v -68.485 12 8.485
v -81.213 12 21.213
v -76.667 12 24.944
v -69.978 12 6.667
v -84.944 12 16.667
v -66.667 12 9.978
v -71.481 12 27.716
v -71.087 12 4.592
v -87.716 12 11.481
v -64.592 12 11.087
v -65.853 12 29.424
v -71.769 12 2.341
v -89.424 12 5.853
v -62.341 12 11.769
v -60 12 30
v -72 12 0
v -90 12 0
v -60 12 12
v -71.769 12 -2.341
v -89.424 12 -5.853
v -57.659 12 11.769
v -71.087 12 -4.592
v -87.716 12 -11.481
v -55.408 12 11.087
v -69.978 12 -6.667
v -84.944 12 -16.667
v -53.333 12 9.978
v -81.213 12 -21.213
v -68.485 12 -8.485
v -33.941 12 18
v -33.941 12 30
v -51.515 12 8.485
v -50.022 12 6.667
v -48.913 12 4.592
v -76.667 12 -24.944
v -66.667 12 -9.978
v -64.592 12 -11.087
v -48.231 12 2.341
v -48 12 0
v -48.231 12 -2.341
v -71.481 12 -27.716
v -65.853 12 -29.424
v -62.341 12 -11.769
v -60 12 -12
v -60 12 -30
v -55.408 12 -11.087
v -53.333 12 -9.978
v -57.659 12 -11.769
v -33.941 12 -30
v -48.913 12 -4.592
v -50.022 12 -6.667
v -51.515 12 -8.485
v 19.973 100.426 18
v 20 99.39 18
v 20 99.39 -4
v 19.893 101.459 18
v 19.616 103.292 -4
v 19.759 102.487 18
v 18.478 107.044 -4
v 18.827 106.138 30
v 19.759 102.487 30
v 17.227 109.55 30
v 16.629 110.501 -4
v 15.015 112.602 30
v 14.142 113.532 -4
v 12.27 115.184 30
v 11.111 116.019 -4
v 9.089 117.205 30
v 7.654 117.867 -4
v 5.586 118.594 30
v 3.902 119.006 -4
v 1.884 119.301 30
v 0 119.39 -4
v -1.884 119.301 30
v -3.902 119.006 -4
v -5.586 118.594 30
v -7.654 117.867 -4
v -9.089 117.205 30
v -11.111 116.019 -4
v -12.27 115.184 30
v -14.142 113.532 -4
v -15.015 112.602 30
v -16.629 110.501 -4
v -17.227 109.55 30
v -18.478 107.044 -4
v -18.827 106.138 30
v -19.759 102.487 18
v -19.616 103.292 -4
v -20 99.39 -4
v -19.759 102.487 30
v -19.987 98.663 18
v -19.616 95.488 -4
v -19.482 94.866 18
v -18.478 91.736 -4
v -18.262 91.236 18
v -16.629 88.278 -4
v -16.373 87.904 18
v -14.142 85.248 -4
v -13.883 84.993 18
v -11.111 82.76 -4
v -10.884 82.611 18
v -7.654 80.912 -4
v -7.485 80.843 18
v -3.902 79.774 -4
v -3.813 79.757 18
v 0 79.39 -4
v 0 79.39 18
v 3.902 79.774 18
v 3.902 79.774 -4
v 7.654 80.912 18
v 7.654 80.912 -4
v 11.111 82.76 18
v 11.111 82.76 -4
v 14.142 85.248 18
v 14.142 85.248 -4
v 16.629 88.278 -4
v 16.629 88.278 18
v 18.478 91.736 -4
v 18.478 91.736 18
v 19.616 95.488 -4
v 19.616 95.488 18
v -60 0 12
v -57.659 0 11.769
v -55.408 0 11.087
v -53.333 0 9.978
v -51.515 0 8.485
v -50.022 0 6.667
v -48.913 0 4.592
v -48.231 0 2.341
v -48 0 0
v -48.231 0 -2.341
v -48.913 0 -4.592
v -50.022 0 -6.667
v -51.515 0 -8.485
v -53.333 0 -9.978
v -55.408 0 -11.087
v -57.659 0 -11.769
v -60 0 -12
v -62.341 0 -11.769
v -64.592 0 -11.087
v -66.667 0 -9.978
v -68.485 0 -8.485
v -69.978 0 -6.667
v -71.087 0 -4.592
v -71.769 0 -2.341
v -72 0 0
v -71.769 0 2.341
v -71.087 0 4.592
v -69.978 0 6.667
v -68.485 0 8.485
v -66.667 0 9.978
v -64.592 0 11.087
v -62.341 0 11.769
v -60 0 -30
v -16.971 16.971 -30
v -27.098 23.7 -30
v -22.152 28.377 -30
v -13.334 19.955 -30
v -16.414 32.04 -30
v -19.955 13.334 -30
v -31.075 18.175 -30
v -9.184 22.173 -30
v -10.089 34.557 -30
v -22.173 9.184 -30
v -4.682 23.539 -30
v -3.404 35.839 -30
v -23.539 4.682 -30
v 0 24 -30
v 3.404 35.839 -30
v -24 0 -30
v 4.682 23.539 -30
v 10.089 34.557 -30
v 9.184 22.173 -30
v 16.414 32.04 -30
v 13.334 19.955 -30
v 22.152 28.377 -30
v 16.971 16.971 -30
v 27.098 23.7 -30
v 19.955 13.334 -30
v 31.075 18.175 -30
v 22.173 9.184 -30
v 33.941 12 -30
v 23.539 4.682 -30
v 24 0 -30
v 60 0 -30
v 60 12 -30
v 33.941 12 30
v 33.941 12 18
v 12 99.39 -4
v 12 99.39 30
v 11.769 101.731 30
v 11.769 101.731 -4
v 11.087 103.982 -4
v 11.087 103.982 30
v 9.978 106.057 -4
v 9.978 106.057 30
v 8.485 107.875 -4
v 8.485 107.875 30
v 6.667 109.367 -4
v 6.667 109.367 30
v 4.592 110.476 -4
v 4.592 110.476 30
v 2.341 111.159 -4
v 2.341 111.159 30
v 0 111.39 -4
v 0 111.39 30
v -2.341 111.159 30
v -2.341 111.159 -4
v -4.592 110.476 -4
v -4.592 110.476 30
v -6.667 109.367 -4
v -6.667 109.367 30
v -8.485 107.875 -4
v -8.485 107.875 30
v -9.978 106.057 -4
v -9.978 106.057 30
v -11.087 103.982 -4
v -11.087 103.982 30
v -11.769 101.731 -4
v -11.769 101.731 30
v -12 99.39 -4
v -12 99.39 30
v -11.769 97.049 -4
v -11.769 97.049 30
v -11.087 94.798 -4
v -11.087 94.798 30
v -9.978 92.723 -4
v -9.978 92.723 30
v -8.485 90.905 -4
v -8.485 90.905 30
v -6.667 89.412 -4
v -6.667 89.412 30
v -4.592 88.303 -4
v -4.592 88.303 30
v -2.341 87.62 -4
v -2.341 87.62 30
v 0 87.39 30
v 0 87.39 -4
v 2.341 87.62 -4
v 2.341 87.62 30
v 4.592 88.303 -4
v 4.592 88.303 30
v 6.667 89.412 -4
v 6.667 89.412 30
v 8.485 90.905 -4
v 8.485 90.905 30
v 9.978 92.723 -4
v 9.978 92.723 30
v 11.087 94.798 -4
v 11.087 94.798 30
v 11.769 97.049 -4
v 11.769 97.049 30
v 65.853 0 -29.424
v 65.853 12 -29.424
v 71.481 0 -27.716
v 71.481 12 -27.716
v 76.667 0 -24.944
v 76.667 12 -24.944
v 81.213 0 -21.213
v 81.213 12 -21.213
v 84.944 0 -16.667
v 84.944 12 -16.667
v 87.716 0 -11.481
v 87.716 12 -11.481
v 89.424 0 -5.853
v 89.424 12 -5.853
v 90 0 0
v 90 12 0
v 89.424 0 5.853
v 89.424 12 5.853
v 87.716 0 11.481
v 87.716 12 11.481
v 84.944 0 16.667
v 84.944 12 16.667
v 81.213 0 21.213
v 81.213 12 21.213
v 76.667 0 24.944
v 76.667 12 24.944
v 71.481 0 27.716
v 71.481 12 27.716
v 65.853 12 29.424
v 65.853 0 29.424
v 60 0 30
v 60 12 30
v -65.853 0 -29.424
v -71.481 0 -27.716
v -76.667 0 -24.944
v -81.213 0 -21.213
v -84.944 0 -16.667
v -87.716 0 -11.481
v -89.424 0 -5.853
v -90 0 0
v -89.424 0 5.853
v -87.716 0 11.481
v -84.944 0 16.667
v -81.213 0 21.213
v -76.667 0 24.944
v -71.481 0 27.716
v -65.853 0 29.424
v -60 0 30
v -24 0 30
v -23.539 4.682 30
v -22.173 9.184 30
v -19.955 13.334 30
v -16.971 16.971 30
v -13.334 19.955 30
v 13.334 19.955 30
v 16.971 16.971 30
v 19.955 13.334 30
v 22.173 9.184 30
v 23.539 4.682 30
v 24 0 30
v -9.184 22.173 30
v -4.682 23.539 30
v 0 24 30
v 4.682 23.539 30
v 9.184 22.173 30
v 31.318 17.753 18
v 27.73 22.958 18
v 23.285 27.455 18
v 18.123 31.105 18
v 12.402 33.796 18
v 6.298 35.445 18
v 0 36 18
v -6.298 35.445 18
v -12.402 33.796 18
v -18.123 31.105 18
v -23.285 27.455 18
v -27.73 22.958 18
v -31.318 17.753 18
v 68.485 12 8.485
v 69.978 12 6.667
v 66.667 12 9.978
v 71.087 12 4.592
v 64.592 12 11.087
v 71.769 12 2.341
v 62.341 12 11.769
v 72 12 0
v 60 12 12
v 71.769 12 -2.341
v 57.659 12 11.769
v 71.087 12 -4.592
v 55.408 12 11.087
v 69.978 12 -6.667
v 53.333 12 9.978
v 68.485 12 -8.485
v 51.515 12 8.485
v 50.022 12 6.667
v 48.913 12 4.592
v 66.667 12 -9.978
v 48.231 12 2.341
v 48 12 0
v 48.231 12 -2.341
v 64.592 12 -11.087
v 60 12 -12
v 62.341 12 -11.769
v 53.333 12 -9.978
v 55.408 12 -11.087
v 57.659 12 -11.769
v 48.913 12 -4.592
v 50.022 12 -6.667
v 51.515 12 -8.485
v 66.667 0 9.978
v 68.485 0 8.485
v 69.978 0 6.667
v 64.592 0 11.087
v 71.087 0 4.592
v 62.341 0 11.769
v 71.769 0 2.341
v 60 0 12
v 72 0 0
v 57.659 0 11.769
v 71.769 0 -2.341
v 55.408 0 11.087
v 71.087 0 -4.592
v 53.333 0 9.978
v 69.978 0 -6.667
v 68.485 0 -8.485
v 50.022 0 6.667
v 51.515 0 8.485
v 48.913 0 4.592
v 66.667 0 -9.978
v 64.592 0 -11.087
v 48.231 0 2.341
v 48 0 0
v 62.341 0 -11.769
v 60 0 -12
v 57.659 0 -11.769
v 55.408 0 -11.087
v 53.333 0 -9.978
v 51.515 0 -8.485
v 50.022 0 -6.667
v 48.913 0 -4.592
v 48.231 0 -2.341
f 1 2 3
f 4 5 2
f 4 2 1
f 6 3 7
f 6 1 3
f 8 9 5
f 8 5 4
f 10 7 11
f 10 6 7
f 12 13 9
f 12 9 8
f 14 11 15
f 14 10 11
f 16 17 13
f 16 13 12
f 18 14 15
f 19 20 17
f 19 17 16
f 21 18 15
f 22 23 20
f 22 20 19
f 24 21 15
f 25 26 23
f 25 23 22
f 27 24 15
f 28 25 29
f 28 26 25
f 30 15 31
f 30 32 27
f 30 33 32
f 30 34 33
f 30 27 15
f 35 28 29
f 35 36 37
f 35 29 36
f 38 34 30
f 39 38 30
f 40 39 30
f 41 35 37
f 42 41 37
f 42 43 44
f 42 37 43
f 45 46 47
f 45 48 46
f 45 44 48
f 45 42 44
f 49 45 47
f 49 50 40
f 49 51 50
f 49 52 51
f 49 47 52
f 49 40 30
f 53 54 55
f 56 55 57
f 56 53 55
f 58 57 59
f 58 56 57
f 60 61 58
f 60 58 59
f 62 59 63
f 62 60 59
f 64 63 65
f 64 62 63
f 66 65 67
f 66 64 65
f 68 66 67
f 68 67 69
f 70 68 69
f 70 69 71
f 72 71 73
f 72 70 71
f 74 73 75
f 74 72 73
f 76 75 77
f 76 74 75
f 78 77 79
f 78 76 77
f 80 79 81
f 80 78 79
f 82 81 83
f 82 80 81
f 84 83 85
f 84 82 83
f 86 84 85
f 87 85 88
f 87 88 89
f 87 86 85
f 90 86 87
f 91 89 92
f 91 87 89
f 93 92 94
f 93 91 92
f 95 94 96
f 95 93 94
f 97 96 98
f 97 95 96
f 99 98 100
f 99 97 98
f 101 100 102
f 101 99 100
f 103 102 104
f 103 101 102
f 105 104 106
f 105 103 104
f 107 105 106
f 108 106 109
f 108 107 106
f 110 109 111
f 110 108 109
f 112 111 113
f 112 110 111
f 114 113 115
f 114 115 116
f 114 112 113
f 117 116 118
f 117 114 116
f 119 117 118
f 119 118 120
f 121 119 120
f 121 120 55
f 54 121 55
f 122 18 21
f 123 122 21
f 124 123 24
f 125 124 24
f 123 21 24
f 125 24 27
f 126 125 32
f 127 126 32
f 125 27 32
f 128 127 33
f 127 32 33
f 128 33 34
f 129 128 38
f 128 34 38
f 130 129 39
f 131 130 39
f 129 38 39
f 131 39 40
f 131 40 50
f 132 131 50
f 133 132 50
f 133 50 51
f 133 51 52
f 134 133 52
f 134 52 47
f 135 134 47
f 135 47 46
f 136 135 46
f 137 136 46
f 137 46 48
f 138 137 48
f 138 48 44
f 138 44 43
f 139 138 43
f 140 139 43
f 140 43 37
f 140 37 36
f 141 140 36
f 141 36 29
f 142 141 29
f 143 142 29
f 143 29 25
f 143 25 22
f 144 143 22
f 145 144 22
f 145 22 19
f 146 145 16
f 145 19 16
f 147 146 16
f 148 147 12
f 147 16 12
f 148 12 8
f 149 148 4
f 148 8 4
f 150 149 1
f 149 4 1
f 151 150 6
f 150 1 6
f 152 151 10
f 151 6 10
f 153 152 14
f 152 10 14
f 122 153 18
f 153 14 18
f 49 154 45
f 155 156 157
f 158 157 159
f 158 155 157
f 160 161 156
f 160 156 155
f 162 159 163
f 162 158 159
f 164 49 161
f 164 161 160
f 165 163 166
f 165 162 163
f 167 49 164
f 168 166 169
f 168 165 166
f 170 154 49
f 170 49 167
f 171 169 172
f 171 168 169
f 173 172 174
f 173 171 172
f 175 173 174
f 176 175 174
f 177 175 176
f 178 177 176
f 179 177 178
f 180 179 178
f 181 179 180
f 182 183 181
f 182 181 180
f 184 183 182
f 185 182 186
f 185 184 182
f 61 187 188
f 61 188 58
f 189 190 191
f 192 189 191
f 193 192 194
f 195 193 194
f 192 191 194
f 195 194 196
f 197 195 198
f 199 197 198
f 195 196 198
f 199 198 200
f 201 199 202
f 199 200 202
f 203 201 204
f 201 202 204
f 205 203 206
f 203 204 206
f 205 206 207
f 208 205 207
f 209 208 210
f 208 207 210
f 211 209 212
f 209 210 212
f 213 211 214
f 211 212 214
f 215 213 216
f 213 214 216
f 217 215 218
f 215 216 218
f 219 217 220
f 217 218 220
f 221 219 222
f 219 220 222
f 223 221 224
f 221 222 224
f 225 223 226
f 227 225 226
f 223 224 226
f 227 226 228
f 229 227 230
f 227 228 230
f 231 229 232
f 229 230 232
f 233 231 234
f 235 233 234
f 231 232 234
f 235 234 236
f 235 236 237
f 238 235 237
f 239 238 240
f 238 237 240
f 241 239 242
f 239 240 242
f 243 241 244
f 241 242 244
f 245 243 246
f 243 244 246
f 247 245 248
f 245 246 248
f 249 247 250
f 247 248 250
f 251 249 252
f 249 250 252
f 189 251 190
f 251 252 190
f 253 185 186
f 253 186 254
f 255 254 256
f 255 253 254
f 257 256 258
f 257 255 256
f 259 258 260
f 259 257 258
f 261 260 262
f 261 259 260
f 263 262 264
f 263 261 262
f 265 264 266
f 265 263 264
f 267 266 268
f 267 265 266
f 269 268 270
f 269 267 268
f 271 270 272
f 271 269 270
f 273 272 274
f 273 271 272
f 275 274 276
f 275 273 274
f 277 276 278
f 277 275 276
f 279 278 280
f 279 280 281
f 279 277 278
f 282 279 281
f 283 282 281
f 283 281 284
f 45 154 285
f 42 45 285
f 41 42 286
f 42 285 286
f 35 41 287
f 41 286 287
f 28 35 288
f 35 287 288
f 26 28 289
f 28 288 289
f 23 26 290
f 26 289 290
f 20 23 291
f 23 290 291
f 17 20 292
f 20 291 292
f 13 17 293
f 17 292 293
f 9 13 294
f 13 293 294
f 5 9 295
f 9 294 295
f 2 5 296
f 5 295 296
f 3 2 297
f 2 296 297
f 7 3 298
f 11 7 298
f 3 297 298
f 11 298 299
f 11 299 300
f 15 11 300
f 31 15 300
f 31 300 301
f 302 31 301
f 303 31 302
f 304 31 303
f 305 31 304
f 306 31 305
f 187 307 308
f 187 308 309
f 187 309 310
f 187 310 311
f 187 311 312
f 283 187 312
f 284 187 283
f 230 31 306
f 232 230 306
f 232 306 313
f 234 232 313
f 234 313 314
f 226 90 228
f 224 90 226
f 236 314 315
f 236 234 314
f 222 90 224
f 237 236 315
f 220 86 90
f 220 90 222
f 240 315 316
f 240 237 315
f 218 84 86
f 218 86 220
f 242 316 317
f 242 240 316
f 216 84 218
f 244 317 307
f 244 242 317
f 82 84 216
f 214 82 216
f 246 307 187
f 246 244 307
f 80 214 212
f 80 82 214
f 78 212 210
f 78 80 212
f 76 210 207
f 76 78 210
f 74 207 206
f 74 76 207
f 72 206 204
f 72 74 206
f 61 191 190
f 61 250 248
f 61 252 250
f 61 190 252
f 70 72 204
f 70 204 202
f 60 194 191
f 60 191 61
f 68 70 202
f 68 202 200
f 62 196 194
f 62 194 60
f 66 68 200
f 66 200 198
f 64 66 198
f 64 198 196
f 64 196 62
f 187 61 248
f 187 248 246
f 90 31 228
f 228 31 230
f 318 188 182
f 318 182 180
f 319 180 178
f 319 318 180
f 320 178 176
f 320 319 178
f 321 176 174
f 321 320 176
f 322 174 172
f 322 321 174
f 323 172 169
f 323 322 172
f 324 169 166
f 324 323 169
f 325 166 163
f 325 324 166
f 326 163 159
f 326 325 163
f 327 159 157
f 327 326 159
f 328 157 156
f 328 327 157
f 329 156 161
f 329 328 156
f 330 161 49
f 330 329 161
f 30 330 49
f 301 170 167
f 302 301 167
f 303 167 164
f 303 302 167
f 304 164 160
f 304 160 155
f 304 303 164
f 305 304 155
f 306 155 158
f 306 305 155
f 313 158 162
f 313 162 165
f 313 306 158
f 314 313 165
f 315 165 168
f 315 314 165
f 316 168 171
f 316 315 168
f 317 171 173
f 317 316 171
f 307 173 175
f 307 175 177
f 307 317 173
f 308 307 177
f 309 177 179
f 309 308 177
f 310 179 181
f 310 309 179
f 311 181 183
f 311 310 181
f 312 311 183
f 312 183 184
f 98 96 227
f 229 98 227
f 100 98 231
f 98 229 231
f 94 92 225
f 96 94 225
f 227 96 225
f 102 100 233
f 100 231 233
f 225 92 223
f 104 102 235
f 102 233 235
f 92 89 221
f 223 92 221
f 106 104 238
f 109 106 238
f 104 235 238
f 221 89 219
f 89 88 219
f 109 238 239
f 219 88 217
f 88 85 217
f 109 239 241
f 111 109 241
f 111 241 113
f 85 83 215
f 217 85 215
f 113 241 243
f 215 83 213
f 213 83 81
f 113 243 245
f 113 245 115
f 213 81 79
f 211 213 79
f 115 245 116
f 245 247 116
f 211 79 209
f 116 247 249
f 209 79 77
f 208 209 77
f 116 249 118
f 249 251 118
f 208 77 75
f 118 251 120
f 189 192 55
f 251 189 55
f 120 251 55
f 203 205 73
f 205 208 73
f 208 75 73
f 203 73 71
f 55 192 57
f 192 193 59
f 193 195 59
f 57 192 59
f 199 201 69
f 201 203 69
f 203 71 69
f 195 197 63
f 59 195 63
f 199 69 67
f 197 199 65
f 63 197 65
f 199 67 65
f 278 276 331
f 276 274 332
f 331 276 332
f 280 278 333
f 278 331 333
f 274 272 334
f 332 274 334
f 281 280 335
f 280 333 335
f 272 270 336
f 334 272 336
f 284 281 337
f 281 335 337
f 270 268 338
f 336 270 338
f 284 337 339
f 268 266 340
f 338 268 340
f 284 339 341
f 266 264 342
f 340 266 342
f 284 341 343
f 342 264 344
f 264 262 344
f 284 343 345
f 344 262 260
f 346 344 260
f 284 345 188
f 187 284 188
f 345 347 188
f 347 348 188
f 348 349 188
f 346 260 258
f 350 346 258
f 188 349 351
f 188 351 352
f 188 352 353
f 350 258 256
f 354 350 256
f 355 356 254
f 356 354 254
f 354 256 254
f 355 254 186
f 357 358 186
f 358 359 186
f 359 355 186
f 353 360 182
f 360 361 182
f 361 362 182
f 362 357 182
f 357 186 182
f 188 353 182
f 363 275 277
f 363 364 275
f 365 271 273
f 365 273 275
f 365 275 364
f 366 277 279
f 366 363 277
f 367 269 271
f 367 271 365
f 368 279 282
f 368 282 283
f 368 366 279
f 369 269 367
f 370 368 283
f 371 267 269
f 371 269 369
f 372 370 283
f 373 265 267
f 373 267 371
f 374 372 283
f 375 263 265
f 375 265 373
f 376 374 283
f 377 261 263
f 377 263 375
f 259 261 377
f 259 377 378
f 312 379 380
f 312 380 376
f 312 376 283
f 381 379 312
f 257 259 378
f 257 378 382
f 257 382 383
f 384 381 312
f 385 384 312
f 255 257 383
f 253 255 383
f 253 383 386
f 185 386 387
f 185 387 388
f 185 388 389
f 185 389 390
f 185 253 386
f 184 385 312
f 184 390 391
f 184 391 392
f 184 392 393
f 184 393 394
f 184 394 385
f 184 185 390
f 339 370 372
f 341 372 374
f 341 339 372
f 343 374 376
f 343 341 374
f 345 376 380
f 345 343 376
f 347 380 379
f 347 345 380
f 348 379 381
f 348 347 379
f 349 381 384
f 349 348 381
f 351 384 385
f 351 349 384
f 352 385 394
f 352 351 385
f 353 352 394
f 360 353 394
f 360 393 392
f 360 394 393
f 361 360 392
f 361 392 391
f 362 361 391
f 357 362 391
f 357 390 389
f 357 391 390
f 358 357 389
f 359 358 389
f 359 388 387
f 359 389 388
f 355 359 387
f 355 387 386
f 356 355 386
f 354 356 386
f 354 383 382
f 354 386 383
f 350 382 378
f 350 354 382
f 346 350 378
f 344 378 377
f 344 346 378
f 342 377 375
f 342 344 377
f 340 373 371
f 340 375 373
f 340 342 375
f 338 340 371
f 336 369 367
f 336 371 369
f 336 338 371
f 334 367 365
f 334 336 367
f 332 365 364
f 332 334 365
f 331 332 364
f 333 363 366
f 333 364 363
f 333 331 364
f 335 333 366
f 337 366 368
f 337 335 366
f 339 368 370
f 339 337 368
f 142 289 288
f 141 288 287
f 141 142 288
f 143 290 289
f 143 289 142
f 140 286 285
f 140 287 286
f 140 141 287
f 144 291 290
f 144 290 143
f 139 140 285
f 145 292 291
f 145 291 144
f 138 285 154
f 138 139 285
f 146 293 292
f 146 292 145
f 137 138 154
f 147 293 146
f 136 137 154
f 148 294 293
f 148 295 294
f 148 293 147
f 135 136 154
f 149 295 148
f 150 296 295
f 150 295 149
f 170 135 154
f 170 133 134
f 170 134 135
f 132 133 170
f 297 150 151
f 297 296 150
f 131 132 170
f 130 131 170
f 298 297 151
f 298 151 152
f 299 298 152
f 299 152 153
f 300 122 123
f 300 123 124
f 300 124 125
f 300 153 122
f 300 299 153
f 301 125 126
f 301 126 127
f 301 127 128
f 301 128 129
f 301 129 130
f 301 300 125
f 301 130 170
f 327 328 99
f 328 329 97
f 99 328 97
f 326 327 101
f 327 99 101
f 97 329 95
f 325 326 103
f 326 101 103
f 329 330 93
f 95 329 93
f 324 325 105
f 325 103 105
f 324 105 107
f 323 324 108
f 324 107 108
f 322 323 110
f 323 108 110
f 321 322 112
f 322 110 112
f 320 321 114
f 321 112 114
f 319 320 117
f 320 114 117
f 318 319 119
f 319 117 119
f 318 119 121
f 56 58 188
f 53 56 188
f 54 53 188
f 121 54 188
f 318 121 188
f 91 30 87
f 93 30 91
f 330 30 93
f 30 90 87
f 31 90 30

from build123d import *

# Parameters (mm, degrees)
BOSS_EXTRUDE1_DEPTH = 30
BOSS_EXTRUDE2_DEPTH = 12
SKETCH4_R           = 20
BOSS_EXTRUDE3_DEPTH = 34
SKETCH4_3_R         = 12
CUT_EXTRUDE1_DEPTH  = 34
BOSS_EXTRUDE4_DEPTH = 12
SKETCH5_R           = 12
CUT_EXTRUDE2_DEPTH  = 144.291935896


with BuildPart() as part:
    # Sketch2 → Boss-Extrude1 (new, symmetric)
    with BuildSketch(Plane.XY):
        with BuildLine():
            Line((-36, 0), (-24, 0))
            ThreePointArc((-24, 0), (0, 24), (24, 0))
            Line((24, 0), (36, 0))
            ThreePointArc((36, 0), (0, 36), (-36, 0))
        make_face()
    extrude(amount=BOSS_EXTRUDE1_DEPTH, both=True)

    # Sketch3 → Boss-Extrude2 (add)
    with BuildSketch(Plane(origin=(0, 0, 0), x_dir=(1, 0, 0), z_dir=(0, 1, 0))):
        with BuildLine():
            Line((36, 30), (60, 30))
            ThreePointArc((60, 30), (90, 0), (60, -30))
            Line((60, -30), (36, -30))
            Line((36, -30), (30, -30))
            Line((30, -30), (30, 30))
            Line((30, 30), (36, 30))
        make_face()
        with BuildLine():
            Line((-30, 30), (-36, 30))
            Line((-36, 30), (-60, 30))
            ThreePointArc((-60, 30), (-90, 0), (-60, -30))
            Line((-60, -30), (-36, -30))
            Line((-36, -30), (-30, -30))
            Line((-30, -30), (-30, 30))
        make_face()
    extrude(amount=BOSS_EXTRUDE2_DEPTH)



with BuildPart() as body_2:
    # Sketch4 → Boss-Extrude3 (new body)
    with BuildSketch(Plane.XY.offset(30)):
        with Locations((0, 99.389845389)):
            Circle(SKETCH4_R)
    extrude(amount=-BOSS_EXTRUDE3_DEPTH)

    # Sketch4<3> → Cut-Extrude1 (cut)
    with BuildSketch(Plane.XY.offset(30)):
        with Locations((0, 99.389845389)):
            Circle(SKETCH4_3_R)
    extrude(amount=-CUT_EXTRUDE1_DEPTH, mode=Mode.SUBTRACT)


with BuildPart() as part_1:
    add(part.part)

    add(body_2.part)  # Boss-Extrude4 merges body 2
    # Sketch4<4> → Boss-Extrude4 (add)
    with BuildSketch(Plane.XY.offset(30)):
        with BuildLine():
            ThreePointArc((-33.941125497, 12), (0, 36), (33.941125497, 12))
            Line((33.941125497, 12), (19.75877981, 102.486718075))
            ThreePointArc((19.75877981, 102.486718075), (0, 79.389845389), (-19.75877981, 102.486718075))
            Line((-19.75877981, 102.486718075), (-33.941125497, 12))
        make_face()
    extrude(amount=-BOSS_EXTRUDE4_DEPTH)

    # Sketch5 → Cut-Extrude2 (cut, through all)
    with BuildSketch(Plane(origin=(0, 12, 0), x_dir=(1, 0, 0), z_dir=(0, 1, 0))):
        with Locations((-60, 0)):
            Circle(SKETCH5_R)
    cut_extrude2 = extrude(amount=-CUT_EXTRUDE2_DEPTH, mode=Mode.SUBTRACT)

    # Mirror1: Cut-Extrude2 across plane
    add(cut_extrude2.mirror(Plane(origin=(0, 0, 0), x_dir=(0, 0, 1), z_dir=(1, 0, 0))), mode=Mode.SUBTRACT)


solid = part_1.part
